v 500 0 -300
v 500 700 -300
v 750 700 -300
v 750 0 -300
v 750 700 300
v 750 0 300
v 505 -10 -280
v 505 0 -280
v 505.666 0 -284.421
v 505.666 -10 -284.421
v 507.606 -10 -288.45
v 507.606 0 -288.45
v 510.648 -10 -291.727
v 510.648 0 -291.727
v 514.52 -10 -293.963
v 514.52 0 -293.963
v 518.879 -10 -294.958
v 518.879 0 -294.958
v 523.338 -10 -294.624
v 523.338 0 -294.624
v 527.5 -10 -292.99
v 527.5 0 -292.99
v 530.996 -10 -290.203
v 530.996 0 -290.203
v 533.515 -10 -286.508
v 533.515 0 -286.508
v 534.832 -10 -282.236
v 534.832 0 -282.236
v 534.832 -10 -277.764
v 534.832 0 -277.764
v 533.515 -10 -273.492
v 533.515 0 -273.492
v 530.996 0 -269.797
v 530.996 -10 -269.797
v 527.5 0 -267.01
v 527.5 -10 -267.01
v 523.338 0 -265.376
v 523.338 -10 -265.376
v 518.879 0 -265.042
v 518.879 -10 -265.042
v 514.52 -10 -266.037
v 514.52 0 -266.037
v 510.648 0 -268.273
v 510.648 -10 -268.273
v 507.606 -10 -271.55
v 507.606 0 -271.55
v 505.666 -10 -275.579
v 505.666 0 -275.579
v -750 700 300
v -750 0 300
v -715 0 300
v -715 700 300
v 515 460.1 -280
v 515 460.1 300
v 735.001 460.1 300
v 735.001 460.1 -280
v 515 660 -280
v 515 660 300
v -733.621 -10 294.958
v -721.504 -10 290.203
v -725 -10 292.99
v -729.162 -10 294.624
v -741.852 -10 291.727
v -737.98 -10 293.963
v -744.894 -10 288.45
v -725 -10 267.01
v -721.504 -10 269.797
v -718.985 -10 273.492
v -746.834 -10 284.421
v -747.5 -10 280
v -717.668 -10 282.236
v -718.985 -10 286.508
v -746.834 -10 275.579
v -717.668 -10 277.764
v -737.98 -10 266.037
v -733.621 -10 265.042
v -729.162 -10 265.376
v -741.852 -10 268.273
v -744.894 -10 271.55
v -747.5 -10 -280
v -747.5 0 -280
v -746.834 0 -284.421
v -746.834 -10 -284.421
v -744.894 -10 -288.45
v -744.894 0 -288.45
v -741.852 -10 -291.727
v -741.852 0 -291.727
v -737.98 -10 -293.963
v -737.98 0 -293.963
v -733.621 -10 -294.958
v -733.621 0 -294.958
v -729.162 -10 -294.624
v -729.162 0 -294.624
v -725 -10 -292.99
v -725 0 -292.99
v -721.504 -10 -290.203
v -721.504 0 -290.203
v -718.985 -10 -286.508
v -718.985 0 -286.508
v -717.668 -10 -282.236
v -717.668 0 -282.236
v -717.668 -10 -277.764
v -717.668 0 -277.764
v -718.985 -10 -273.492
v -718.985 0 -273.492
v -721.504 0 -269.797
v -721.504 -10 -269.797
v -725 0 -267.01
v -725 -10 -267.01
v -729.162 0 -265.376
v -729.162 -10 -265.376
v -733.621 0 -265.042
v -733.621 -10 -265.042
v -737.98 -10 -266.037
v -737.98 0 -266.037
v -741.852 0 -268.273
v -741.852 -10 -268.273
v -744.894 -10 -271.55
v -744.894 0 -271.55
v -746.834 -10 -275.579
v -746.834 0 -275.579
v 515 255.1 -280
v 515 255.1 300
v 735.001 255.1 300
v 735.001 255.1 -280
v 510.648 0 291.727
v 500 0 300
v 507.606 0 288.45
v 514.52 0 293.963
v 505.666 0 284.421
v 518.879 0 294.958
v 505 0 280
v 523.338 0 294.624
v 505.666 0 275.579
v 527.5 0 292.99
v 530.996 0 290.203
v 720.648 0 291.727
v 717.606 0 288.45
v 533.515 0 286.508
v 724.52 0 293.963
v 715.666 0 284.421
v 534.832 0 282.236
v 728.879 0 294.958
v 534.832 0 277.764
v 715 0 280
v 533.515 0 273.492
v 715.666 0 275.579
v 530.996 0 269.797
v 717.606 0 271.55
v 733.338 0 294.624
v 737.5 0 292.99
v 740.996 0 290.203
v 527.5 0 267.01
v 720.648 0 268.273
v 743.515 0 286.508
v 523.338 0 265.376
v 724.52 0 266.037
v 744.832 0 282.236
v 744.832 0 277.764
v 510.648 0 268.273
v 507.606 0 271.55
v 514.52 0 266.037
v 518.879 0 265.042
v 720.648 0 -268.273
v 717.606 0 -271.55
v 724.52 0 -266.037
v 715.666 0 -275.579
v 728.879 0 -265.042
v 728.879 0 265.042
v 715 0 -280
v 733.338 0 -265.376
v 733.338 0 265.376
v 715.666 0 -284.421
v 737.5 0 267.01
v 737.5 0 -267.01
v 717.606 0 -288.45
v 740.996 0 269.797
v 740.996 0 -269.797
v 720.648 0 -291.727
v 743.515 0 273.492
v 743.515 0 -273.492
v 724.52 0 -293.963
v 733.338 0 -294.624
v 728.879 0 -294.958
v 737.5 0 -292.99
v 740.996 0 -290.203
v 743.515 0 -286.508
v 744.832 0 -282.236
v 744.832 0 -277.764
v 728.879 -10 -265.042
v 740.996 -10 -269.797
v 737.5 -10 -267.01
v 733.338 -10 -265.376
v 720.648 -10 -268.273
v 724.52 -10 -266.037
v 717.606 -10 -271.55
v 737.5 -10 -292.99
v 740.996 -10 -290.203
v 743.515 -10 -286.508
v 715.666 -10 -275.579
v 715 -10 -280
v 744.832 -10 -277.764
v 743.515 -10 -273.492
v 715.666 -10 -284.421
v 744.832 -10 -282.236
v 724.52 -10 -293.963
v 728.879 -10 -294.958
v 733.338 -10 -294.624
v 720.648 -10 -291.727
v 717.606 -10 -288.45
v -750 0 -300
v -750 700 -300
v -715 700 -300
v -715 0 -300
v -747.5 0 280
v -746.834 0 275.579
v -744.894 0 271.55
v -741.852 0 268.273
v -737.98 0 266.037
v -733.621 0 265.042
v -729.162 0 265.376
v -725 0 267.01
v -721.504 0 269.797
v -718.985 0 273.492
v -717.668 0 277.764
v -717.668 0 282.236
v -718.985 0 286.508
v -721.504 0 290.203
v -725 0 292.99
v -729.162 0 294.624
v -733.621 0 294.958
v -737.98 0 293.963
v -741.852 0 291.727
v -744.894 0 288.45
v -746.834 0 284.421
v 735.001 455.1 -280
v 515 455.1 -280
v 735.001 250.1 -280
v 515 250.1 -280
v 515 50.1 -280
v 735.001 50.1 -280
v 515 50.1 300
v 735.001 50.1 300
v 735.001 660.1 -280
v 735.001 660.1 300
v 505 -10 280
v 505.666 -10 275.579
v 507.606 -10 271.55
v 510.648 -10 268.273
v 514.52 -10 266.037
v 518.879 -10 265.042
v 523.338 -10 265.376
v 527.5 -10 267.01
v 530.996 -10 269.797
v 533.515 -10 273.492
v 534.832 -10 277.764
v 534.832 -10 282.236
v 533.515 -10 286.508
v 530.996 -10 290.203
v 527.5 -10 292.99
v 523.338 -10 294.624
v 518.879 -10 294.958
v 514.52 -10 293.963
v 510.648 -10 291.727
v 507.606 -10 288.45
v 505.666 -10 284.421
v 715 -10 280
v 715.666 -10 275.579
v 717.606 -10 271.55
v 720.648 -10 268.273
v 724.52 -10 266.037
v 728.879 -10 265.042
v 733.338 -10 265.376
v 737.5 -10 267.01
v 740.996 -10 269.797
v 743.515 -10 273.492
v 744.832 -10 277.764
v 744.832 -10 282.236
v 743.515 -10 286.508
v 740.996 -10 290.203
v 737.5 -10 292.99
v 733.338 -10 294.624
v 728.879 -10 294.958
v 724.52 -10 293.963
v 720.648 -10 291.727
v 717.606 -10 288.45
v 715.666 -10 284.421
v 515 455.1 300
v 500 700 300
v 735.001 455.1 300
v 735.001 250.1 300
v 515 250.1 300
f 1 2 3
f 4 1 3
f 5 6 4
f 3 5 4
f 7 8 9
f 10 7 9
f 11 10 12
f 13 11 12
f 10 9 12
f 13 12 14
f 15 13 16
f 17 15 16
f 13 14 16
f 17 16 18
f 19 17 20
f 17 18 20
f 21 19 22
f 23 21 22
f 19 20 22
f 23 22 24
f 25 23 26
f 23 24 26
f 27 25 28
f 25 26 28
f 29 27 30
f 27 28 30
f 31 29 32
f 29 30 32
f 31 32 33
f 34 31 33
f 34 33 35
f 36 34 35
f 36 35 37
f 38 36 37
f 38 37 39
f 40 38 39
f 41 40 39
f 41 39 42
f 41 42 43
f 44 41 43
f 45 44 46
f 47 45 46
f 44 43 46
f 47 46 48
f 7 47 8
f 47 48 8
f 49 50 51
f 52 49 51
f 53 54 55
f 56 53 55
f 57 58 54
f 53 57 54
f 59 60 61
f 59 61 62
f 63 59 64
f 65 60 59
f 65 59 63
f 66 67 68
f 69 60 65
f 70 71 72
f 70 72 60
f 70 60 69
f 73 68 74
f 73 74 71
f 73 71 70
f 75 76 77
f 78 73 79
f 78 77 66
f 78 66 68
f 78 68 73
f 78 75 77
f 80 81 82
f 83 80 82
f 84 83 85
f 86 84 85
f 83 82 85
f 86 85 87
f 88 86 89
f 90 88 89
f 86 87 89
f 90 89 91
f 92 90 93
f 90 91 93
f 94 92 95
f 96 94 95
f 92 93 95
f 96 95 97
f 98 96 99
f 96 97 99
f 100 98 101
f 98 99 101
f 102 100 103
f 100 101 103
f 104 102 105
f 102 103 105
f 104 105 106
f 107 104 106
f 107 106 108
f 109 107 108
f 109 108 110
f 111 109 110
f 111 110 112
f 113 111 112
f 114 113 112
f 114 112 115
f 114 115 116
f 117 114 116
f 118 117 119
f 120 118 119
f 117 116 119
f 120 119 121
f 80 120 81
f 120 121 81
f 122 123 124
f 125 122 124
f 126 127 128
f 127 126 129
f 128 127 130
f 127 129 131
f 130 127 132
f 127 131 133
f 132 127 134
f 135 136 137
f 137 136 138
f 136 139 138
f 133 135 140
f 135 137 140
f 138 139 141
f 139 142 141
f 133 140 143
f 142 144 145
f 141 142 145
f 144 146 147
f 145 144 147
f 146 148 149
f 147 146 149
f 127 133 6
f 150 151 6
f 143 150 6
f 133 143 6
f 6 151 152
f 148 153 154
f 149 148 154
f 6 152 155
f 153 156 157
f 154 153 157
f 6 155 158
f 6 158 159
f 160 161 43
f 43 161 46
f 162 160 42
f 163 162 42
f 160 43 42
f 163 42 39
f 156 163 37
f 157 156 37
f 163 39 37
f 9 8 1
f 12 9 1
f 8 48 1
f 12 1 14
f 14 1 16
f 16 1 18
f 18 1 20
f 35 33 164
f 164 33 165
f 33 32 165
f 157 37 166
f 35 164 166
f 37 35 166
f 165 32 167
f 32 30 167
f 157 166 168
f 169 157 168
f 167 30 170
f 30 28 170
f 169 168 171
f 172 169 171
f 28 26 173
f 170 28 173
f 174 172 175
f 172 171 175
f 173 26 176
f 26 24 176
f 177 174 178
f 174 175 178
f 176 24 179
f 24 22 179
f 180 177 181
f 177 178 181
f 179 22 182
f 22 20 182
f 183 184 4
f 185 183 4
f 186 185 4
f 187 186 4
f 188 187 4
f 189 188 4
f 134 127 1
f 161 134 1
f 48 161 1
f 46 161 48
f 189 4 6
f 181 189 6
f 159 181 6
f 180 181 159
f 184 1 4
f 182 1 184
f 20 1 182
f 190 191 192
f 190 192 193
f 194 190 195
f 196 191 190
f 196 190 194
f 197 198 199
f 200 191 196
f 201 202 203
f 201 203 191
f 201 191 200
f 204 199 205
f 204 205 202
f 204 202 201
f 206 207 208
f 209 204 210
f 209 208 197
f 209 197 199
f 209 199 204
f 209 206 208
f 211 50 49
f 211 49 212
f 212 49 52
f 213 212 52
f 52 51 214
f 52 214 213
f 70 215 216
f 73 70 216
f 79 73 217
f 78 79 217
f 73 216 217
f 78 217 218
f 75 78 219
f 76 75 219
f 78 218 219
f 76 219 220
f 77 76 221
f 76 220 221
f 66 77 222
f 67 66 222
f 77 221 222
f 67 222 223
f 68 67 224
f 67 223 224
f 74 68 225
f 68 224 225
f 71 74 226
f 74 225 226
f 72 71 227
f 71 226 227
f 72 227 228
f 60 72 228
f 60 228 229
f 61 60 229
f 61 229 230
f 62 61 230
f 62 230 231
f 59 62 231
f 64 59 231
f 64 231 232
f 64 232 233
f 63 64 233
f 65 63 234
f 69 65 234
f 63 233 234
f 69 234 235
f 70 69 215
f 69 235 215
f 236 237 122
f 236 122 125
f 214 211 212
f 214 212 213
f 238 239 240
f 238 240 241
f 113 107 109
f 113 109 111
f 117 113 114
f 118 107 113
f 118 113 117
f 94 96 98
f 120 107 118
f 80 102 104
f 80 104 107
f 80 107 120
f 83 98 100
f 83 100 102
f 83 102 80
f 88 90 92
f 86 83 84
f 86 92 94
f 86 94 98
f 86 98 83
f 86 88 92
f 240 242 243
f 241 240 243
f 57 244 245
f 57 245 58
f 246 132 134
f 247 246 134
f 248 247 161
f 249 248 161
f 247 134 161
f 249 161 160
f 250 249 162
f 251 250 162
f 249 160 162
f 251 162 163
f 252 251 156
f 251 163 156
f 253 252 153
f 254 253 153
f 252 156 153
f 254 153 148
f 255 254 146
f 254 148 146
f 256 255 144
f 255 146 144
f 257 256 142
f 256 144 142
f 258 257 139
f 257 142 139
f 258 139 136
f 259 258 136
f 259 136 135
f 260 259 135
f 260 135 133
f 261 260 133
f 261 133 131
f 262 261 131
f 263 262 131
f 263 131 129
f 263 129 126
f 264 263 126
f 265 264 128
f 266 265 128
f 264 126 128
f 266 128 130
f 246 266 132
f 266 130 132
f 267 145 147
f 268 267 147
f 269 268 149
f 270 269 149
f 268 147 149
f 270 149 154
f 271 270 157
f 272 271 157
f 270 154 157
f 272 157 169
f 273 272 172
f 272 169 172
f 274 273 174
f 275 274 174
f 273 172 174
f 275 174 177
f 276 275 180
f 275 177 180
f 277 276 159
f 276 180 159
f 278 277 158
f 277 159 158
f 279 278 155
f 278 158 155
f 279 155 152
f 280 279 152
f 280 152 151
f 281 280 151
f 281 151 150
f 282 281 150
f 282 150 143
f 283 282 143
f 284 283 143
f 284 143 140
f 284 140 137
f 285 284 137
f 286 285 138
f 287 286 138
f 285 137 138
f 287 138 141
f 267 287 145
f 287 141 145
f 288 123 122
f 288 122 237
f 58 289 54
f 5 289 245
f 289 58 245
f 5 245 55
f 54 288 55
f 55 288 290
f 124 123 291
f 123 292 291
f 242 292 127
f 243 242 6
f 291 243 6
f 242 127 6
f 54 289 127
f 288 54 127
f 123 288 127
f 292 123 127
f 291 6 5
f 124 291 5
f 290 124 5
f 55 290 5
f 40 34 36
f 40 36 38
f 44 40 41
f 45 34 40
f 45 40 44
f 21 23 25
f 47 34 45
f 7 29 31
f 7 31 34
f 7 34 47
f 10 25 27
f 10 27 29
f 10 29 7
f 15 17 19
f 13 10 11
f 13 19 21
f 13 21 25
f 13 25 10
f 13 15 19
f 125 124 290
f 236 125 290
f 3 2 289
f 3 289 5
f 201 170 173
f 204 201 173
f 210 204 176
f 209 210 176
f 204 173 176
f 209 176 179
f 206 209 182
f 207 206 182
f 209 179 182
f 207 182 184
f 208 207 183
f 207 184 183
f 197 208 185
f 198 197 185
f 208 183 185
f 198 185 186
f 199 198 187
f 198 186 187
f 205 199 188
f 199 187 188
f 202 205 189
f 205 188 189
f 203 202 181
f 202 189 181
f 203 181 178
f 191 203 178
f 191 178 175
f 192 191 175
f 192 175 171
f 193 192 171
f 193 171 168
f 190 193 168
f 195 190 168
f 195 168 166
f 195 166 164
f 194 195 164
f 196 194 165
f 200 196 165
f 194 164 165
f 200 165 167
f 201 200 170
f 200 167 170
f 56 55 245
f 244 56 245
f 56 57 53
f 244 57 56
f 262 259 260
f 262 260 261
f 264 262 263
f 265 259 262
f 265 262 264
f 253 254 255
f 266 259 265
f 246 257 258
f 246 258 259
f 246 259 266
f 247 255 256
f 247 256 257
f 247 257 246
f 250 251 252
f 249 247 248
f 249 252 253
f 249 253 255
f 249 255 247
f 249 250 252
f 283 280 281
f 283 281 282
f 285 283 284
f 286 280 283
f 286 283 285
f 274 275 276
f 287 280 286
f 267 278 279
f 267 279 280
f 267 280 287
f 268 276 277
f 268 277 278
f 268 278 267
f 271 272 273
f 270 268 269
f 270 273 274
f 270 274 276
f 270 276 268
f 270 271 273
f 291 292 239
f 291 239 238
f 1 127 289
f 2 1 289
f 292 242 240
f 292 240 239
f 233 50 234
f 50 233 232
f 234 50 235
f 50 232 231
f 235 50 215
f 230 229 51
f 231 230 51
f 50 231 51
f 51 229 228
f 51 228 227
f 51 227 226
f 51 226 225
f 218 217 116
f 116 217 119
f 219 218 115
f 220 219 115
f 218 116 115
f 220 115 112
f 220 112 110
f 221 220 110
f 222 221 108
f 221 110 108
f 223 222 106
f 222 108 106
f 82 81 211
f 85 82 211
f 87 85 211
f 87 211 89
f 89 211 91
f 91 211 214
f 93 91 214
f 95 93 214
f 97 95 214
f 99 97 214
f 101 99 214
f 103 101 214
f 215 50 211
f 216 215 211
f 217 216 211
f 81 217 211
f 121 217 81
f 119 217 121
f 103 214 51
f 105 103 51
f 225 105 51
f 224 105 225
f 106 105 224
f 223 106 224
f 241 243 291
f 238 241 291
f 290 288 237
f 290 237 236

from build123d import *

# Parameters (mm, degrees)
SKETCH1_W           = 1500
SKETCH1_H           = 600
BOSS_EXTRUDE1_DEPTH = 700
SKETCH4_W           = 1215
SKETCH4_H           = 700
CUT_EXTRUDE2_DEPTH  = 750
SKETCH5_W           = 220.000567729
SKETCH5_H           = 200
CUT_EXTRUDE3_DEPTH  = 580
SKETCH6_R           = 15
BOSS_EXTRUDE3_DEPTH = 10


with BuildPart() as part:
    # Sketch1 → Boss-Extrude1 (new body)
    with BuildSketch(Plane(origin=(0, 0, 0), x_dir=(1, 0, 0), z_dir=(0, 1, 0))):
        Rectangle(SKETCH1_W, SKETCH1_H)
    extrude(amount=BOSS_EXTRUDE1_DEPTH)

    # Sketch4 → Cut-Extrude2 (cut)
    with BuildSketch(Plane.XY.offset(300)):
        with Locations((-107.5, 350)):
            Rectangle(SKETCH4_W, SKETCH4_H)
    extrude(amount=-CUT_EXTRUDE2_DEPTH, mode=Mode.SUBTRACT)

    # Sketch5 → Cut-Extrude3 (cut)
    with BuildSketch(Plane.XY.offset(300)):
        Polygon((515, 660), (515, 460.099912453), (735.000567729, 460.099912453), (735.000567729, 660.099912453), align=None)
        with Locations((625.000283865, 355.099912453)):
            Rectangle(SKETCH5_W, SKETCH5_H)
        with Locations((625.000283865, 150.099912453)):
            Rectangle(SKETCH5_W, SKETCH5_H)
    extrude(amount=-CUT_EXTRUDE3_DEPTH, mode=Mode.SUBTRACT)

    # Sketch6 → Boss-Extrude3 (add)
    with BuildSketch(Plane(origin=(0, 0, 0), x_dir=(-1, 0, 0), z_dir=(0, -1, 0))):
        with Locations((732.5, -280)):
            Circle(SKETCH6_R)
        with Locations((732.5, 280)):
            Circle(SKETCH6_R)
        with Locations((-520, -280)):
            Circle(SKETCH6_R)
        with Locations((-520, 280)):
            Circle(SKETCH6_R)
        with Locations((-730, 280)):
            Circle(SKETCH6_R)
        with Locations((-730, -280)):
            Circle(SKETCH6_R)
    extrude(amount=BOSS_EXTRUDE3_DEPTH)


solid = part.part
